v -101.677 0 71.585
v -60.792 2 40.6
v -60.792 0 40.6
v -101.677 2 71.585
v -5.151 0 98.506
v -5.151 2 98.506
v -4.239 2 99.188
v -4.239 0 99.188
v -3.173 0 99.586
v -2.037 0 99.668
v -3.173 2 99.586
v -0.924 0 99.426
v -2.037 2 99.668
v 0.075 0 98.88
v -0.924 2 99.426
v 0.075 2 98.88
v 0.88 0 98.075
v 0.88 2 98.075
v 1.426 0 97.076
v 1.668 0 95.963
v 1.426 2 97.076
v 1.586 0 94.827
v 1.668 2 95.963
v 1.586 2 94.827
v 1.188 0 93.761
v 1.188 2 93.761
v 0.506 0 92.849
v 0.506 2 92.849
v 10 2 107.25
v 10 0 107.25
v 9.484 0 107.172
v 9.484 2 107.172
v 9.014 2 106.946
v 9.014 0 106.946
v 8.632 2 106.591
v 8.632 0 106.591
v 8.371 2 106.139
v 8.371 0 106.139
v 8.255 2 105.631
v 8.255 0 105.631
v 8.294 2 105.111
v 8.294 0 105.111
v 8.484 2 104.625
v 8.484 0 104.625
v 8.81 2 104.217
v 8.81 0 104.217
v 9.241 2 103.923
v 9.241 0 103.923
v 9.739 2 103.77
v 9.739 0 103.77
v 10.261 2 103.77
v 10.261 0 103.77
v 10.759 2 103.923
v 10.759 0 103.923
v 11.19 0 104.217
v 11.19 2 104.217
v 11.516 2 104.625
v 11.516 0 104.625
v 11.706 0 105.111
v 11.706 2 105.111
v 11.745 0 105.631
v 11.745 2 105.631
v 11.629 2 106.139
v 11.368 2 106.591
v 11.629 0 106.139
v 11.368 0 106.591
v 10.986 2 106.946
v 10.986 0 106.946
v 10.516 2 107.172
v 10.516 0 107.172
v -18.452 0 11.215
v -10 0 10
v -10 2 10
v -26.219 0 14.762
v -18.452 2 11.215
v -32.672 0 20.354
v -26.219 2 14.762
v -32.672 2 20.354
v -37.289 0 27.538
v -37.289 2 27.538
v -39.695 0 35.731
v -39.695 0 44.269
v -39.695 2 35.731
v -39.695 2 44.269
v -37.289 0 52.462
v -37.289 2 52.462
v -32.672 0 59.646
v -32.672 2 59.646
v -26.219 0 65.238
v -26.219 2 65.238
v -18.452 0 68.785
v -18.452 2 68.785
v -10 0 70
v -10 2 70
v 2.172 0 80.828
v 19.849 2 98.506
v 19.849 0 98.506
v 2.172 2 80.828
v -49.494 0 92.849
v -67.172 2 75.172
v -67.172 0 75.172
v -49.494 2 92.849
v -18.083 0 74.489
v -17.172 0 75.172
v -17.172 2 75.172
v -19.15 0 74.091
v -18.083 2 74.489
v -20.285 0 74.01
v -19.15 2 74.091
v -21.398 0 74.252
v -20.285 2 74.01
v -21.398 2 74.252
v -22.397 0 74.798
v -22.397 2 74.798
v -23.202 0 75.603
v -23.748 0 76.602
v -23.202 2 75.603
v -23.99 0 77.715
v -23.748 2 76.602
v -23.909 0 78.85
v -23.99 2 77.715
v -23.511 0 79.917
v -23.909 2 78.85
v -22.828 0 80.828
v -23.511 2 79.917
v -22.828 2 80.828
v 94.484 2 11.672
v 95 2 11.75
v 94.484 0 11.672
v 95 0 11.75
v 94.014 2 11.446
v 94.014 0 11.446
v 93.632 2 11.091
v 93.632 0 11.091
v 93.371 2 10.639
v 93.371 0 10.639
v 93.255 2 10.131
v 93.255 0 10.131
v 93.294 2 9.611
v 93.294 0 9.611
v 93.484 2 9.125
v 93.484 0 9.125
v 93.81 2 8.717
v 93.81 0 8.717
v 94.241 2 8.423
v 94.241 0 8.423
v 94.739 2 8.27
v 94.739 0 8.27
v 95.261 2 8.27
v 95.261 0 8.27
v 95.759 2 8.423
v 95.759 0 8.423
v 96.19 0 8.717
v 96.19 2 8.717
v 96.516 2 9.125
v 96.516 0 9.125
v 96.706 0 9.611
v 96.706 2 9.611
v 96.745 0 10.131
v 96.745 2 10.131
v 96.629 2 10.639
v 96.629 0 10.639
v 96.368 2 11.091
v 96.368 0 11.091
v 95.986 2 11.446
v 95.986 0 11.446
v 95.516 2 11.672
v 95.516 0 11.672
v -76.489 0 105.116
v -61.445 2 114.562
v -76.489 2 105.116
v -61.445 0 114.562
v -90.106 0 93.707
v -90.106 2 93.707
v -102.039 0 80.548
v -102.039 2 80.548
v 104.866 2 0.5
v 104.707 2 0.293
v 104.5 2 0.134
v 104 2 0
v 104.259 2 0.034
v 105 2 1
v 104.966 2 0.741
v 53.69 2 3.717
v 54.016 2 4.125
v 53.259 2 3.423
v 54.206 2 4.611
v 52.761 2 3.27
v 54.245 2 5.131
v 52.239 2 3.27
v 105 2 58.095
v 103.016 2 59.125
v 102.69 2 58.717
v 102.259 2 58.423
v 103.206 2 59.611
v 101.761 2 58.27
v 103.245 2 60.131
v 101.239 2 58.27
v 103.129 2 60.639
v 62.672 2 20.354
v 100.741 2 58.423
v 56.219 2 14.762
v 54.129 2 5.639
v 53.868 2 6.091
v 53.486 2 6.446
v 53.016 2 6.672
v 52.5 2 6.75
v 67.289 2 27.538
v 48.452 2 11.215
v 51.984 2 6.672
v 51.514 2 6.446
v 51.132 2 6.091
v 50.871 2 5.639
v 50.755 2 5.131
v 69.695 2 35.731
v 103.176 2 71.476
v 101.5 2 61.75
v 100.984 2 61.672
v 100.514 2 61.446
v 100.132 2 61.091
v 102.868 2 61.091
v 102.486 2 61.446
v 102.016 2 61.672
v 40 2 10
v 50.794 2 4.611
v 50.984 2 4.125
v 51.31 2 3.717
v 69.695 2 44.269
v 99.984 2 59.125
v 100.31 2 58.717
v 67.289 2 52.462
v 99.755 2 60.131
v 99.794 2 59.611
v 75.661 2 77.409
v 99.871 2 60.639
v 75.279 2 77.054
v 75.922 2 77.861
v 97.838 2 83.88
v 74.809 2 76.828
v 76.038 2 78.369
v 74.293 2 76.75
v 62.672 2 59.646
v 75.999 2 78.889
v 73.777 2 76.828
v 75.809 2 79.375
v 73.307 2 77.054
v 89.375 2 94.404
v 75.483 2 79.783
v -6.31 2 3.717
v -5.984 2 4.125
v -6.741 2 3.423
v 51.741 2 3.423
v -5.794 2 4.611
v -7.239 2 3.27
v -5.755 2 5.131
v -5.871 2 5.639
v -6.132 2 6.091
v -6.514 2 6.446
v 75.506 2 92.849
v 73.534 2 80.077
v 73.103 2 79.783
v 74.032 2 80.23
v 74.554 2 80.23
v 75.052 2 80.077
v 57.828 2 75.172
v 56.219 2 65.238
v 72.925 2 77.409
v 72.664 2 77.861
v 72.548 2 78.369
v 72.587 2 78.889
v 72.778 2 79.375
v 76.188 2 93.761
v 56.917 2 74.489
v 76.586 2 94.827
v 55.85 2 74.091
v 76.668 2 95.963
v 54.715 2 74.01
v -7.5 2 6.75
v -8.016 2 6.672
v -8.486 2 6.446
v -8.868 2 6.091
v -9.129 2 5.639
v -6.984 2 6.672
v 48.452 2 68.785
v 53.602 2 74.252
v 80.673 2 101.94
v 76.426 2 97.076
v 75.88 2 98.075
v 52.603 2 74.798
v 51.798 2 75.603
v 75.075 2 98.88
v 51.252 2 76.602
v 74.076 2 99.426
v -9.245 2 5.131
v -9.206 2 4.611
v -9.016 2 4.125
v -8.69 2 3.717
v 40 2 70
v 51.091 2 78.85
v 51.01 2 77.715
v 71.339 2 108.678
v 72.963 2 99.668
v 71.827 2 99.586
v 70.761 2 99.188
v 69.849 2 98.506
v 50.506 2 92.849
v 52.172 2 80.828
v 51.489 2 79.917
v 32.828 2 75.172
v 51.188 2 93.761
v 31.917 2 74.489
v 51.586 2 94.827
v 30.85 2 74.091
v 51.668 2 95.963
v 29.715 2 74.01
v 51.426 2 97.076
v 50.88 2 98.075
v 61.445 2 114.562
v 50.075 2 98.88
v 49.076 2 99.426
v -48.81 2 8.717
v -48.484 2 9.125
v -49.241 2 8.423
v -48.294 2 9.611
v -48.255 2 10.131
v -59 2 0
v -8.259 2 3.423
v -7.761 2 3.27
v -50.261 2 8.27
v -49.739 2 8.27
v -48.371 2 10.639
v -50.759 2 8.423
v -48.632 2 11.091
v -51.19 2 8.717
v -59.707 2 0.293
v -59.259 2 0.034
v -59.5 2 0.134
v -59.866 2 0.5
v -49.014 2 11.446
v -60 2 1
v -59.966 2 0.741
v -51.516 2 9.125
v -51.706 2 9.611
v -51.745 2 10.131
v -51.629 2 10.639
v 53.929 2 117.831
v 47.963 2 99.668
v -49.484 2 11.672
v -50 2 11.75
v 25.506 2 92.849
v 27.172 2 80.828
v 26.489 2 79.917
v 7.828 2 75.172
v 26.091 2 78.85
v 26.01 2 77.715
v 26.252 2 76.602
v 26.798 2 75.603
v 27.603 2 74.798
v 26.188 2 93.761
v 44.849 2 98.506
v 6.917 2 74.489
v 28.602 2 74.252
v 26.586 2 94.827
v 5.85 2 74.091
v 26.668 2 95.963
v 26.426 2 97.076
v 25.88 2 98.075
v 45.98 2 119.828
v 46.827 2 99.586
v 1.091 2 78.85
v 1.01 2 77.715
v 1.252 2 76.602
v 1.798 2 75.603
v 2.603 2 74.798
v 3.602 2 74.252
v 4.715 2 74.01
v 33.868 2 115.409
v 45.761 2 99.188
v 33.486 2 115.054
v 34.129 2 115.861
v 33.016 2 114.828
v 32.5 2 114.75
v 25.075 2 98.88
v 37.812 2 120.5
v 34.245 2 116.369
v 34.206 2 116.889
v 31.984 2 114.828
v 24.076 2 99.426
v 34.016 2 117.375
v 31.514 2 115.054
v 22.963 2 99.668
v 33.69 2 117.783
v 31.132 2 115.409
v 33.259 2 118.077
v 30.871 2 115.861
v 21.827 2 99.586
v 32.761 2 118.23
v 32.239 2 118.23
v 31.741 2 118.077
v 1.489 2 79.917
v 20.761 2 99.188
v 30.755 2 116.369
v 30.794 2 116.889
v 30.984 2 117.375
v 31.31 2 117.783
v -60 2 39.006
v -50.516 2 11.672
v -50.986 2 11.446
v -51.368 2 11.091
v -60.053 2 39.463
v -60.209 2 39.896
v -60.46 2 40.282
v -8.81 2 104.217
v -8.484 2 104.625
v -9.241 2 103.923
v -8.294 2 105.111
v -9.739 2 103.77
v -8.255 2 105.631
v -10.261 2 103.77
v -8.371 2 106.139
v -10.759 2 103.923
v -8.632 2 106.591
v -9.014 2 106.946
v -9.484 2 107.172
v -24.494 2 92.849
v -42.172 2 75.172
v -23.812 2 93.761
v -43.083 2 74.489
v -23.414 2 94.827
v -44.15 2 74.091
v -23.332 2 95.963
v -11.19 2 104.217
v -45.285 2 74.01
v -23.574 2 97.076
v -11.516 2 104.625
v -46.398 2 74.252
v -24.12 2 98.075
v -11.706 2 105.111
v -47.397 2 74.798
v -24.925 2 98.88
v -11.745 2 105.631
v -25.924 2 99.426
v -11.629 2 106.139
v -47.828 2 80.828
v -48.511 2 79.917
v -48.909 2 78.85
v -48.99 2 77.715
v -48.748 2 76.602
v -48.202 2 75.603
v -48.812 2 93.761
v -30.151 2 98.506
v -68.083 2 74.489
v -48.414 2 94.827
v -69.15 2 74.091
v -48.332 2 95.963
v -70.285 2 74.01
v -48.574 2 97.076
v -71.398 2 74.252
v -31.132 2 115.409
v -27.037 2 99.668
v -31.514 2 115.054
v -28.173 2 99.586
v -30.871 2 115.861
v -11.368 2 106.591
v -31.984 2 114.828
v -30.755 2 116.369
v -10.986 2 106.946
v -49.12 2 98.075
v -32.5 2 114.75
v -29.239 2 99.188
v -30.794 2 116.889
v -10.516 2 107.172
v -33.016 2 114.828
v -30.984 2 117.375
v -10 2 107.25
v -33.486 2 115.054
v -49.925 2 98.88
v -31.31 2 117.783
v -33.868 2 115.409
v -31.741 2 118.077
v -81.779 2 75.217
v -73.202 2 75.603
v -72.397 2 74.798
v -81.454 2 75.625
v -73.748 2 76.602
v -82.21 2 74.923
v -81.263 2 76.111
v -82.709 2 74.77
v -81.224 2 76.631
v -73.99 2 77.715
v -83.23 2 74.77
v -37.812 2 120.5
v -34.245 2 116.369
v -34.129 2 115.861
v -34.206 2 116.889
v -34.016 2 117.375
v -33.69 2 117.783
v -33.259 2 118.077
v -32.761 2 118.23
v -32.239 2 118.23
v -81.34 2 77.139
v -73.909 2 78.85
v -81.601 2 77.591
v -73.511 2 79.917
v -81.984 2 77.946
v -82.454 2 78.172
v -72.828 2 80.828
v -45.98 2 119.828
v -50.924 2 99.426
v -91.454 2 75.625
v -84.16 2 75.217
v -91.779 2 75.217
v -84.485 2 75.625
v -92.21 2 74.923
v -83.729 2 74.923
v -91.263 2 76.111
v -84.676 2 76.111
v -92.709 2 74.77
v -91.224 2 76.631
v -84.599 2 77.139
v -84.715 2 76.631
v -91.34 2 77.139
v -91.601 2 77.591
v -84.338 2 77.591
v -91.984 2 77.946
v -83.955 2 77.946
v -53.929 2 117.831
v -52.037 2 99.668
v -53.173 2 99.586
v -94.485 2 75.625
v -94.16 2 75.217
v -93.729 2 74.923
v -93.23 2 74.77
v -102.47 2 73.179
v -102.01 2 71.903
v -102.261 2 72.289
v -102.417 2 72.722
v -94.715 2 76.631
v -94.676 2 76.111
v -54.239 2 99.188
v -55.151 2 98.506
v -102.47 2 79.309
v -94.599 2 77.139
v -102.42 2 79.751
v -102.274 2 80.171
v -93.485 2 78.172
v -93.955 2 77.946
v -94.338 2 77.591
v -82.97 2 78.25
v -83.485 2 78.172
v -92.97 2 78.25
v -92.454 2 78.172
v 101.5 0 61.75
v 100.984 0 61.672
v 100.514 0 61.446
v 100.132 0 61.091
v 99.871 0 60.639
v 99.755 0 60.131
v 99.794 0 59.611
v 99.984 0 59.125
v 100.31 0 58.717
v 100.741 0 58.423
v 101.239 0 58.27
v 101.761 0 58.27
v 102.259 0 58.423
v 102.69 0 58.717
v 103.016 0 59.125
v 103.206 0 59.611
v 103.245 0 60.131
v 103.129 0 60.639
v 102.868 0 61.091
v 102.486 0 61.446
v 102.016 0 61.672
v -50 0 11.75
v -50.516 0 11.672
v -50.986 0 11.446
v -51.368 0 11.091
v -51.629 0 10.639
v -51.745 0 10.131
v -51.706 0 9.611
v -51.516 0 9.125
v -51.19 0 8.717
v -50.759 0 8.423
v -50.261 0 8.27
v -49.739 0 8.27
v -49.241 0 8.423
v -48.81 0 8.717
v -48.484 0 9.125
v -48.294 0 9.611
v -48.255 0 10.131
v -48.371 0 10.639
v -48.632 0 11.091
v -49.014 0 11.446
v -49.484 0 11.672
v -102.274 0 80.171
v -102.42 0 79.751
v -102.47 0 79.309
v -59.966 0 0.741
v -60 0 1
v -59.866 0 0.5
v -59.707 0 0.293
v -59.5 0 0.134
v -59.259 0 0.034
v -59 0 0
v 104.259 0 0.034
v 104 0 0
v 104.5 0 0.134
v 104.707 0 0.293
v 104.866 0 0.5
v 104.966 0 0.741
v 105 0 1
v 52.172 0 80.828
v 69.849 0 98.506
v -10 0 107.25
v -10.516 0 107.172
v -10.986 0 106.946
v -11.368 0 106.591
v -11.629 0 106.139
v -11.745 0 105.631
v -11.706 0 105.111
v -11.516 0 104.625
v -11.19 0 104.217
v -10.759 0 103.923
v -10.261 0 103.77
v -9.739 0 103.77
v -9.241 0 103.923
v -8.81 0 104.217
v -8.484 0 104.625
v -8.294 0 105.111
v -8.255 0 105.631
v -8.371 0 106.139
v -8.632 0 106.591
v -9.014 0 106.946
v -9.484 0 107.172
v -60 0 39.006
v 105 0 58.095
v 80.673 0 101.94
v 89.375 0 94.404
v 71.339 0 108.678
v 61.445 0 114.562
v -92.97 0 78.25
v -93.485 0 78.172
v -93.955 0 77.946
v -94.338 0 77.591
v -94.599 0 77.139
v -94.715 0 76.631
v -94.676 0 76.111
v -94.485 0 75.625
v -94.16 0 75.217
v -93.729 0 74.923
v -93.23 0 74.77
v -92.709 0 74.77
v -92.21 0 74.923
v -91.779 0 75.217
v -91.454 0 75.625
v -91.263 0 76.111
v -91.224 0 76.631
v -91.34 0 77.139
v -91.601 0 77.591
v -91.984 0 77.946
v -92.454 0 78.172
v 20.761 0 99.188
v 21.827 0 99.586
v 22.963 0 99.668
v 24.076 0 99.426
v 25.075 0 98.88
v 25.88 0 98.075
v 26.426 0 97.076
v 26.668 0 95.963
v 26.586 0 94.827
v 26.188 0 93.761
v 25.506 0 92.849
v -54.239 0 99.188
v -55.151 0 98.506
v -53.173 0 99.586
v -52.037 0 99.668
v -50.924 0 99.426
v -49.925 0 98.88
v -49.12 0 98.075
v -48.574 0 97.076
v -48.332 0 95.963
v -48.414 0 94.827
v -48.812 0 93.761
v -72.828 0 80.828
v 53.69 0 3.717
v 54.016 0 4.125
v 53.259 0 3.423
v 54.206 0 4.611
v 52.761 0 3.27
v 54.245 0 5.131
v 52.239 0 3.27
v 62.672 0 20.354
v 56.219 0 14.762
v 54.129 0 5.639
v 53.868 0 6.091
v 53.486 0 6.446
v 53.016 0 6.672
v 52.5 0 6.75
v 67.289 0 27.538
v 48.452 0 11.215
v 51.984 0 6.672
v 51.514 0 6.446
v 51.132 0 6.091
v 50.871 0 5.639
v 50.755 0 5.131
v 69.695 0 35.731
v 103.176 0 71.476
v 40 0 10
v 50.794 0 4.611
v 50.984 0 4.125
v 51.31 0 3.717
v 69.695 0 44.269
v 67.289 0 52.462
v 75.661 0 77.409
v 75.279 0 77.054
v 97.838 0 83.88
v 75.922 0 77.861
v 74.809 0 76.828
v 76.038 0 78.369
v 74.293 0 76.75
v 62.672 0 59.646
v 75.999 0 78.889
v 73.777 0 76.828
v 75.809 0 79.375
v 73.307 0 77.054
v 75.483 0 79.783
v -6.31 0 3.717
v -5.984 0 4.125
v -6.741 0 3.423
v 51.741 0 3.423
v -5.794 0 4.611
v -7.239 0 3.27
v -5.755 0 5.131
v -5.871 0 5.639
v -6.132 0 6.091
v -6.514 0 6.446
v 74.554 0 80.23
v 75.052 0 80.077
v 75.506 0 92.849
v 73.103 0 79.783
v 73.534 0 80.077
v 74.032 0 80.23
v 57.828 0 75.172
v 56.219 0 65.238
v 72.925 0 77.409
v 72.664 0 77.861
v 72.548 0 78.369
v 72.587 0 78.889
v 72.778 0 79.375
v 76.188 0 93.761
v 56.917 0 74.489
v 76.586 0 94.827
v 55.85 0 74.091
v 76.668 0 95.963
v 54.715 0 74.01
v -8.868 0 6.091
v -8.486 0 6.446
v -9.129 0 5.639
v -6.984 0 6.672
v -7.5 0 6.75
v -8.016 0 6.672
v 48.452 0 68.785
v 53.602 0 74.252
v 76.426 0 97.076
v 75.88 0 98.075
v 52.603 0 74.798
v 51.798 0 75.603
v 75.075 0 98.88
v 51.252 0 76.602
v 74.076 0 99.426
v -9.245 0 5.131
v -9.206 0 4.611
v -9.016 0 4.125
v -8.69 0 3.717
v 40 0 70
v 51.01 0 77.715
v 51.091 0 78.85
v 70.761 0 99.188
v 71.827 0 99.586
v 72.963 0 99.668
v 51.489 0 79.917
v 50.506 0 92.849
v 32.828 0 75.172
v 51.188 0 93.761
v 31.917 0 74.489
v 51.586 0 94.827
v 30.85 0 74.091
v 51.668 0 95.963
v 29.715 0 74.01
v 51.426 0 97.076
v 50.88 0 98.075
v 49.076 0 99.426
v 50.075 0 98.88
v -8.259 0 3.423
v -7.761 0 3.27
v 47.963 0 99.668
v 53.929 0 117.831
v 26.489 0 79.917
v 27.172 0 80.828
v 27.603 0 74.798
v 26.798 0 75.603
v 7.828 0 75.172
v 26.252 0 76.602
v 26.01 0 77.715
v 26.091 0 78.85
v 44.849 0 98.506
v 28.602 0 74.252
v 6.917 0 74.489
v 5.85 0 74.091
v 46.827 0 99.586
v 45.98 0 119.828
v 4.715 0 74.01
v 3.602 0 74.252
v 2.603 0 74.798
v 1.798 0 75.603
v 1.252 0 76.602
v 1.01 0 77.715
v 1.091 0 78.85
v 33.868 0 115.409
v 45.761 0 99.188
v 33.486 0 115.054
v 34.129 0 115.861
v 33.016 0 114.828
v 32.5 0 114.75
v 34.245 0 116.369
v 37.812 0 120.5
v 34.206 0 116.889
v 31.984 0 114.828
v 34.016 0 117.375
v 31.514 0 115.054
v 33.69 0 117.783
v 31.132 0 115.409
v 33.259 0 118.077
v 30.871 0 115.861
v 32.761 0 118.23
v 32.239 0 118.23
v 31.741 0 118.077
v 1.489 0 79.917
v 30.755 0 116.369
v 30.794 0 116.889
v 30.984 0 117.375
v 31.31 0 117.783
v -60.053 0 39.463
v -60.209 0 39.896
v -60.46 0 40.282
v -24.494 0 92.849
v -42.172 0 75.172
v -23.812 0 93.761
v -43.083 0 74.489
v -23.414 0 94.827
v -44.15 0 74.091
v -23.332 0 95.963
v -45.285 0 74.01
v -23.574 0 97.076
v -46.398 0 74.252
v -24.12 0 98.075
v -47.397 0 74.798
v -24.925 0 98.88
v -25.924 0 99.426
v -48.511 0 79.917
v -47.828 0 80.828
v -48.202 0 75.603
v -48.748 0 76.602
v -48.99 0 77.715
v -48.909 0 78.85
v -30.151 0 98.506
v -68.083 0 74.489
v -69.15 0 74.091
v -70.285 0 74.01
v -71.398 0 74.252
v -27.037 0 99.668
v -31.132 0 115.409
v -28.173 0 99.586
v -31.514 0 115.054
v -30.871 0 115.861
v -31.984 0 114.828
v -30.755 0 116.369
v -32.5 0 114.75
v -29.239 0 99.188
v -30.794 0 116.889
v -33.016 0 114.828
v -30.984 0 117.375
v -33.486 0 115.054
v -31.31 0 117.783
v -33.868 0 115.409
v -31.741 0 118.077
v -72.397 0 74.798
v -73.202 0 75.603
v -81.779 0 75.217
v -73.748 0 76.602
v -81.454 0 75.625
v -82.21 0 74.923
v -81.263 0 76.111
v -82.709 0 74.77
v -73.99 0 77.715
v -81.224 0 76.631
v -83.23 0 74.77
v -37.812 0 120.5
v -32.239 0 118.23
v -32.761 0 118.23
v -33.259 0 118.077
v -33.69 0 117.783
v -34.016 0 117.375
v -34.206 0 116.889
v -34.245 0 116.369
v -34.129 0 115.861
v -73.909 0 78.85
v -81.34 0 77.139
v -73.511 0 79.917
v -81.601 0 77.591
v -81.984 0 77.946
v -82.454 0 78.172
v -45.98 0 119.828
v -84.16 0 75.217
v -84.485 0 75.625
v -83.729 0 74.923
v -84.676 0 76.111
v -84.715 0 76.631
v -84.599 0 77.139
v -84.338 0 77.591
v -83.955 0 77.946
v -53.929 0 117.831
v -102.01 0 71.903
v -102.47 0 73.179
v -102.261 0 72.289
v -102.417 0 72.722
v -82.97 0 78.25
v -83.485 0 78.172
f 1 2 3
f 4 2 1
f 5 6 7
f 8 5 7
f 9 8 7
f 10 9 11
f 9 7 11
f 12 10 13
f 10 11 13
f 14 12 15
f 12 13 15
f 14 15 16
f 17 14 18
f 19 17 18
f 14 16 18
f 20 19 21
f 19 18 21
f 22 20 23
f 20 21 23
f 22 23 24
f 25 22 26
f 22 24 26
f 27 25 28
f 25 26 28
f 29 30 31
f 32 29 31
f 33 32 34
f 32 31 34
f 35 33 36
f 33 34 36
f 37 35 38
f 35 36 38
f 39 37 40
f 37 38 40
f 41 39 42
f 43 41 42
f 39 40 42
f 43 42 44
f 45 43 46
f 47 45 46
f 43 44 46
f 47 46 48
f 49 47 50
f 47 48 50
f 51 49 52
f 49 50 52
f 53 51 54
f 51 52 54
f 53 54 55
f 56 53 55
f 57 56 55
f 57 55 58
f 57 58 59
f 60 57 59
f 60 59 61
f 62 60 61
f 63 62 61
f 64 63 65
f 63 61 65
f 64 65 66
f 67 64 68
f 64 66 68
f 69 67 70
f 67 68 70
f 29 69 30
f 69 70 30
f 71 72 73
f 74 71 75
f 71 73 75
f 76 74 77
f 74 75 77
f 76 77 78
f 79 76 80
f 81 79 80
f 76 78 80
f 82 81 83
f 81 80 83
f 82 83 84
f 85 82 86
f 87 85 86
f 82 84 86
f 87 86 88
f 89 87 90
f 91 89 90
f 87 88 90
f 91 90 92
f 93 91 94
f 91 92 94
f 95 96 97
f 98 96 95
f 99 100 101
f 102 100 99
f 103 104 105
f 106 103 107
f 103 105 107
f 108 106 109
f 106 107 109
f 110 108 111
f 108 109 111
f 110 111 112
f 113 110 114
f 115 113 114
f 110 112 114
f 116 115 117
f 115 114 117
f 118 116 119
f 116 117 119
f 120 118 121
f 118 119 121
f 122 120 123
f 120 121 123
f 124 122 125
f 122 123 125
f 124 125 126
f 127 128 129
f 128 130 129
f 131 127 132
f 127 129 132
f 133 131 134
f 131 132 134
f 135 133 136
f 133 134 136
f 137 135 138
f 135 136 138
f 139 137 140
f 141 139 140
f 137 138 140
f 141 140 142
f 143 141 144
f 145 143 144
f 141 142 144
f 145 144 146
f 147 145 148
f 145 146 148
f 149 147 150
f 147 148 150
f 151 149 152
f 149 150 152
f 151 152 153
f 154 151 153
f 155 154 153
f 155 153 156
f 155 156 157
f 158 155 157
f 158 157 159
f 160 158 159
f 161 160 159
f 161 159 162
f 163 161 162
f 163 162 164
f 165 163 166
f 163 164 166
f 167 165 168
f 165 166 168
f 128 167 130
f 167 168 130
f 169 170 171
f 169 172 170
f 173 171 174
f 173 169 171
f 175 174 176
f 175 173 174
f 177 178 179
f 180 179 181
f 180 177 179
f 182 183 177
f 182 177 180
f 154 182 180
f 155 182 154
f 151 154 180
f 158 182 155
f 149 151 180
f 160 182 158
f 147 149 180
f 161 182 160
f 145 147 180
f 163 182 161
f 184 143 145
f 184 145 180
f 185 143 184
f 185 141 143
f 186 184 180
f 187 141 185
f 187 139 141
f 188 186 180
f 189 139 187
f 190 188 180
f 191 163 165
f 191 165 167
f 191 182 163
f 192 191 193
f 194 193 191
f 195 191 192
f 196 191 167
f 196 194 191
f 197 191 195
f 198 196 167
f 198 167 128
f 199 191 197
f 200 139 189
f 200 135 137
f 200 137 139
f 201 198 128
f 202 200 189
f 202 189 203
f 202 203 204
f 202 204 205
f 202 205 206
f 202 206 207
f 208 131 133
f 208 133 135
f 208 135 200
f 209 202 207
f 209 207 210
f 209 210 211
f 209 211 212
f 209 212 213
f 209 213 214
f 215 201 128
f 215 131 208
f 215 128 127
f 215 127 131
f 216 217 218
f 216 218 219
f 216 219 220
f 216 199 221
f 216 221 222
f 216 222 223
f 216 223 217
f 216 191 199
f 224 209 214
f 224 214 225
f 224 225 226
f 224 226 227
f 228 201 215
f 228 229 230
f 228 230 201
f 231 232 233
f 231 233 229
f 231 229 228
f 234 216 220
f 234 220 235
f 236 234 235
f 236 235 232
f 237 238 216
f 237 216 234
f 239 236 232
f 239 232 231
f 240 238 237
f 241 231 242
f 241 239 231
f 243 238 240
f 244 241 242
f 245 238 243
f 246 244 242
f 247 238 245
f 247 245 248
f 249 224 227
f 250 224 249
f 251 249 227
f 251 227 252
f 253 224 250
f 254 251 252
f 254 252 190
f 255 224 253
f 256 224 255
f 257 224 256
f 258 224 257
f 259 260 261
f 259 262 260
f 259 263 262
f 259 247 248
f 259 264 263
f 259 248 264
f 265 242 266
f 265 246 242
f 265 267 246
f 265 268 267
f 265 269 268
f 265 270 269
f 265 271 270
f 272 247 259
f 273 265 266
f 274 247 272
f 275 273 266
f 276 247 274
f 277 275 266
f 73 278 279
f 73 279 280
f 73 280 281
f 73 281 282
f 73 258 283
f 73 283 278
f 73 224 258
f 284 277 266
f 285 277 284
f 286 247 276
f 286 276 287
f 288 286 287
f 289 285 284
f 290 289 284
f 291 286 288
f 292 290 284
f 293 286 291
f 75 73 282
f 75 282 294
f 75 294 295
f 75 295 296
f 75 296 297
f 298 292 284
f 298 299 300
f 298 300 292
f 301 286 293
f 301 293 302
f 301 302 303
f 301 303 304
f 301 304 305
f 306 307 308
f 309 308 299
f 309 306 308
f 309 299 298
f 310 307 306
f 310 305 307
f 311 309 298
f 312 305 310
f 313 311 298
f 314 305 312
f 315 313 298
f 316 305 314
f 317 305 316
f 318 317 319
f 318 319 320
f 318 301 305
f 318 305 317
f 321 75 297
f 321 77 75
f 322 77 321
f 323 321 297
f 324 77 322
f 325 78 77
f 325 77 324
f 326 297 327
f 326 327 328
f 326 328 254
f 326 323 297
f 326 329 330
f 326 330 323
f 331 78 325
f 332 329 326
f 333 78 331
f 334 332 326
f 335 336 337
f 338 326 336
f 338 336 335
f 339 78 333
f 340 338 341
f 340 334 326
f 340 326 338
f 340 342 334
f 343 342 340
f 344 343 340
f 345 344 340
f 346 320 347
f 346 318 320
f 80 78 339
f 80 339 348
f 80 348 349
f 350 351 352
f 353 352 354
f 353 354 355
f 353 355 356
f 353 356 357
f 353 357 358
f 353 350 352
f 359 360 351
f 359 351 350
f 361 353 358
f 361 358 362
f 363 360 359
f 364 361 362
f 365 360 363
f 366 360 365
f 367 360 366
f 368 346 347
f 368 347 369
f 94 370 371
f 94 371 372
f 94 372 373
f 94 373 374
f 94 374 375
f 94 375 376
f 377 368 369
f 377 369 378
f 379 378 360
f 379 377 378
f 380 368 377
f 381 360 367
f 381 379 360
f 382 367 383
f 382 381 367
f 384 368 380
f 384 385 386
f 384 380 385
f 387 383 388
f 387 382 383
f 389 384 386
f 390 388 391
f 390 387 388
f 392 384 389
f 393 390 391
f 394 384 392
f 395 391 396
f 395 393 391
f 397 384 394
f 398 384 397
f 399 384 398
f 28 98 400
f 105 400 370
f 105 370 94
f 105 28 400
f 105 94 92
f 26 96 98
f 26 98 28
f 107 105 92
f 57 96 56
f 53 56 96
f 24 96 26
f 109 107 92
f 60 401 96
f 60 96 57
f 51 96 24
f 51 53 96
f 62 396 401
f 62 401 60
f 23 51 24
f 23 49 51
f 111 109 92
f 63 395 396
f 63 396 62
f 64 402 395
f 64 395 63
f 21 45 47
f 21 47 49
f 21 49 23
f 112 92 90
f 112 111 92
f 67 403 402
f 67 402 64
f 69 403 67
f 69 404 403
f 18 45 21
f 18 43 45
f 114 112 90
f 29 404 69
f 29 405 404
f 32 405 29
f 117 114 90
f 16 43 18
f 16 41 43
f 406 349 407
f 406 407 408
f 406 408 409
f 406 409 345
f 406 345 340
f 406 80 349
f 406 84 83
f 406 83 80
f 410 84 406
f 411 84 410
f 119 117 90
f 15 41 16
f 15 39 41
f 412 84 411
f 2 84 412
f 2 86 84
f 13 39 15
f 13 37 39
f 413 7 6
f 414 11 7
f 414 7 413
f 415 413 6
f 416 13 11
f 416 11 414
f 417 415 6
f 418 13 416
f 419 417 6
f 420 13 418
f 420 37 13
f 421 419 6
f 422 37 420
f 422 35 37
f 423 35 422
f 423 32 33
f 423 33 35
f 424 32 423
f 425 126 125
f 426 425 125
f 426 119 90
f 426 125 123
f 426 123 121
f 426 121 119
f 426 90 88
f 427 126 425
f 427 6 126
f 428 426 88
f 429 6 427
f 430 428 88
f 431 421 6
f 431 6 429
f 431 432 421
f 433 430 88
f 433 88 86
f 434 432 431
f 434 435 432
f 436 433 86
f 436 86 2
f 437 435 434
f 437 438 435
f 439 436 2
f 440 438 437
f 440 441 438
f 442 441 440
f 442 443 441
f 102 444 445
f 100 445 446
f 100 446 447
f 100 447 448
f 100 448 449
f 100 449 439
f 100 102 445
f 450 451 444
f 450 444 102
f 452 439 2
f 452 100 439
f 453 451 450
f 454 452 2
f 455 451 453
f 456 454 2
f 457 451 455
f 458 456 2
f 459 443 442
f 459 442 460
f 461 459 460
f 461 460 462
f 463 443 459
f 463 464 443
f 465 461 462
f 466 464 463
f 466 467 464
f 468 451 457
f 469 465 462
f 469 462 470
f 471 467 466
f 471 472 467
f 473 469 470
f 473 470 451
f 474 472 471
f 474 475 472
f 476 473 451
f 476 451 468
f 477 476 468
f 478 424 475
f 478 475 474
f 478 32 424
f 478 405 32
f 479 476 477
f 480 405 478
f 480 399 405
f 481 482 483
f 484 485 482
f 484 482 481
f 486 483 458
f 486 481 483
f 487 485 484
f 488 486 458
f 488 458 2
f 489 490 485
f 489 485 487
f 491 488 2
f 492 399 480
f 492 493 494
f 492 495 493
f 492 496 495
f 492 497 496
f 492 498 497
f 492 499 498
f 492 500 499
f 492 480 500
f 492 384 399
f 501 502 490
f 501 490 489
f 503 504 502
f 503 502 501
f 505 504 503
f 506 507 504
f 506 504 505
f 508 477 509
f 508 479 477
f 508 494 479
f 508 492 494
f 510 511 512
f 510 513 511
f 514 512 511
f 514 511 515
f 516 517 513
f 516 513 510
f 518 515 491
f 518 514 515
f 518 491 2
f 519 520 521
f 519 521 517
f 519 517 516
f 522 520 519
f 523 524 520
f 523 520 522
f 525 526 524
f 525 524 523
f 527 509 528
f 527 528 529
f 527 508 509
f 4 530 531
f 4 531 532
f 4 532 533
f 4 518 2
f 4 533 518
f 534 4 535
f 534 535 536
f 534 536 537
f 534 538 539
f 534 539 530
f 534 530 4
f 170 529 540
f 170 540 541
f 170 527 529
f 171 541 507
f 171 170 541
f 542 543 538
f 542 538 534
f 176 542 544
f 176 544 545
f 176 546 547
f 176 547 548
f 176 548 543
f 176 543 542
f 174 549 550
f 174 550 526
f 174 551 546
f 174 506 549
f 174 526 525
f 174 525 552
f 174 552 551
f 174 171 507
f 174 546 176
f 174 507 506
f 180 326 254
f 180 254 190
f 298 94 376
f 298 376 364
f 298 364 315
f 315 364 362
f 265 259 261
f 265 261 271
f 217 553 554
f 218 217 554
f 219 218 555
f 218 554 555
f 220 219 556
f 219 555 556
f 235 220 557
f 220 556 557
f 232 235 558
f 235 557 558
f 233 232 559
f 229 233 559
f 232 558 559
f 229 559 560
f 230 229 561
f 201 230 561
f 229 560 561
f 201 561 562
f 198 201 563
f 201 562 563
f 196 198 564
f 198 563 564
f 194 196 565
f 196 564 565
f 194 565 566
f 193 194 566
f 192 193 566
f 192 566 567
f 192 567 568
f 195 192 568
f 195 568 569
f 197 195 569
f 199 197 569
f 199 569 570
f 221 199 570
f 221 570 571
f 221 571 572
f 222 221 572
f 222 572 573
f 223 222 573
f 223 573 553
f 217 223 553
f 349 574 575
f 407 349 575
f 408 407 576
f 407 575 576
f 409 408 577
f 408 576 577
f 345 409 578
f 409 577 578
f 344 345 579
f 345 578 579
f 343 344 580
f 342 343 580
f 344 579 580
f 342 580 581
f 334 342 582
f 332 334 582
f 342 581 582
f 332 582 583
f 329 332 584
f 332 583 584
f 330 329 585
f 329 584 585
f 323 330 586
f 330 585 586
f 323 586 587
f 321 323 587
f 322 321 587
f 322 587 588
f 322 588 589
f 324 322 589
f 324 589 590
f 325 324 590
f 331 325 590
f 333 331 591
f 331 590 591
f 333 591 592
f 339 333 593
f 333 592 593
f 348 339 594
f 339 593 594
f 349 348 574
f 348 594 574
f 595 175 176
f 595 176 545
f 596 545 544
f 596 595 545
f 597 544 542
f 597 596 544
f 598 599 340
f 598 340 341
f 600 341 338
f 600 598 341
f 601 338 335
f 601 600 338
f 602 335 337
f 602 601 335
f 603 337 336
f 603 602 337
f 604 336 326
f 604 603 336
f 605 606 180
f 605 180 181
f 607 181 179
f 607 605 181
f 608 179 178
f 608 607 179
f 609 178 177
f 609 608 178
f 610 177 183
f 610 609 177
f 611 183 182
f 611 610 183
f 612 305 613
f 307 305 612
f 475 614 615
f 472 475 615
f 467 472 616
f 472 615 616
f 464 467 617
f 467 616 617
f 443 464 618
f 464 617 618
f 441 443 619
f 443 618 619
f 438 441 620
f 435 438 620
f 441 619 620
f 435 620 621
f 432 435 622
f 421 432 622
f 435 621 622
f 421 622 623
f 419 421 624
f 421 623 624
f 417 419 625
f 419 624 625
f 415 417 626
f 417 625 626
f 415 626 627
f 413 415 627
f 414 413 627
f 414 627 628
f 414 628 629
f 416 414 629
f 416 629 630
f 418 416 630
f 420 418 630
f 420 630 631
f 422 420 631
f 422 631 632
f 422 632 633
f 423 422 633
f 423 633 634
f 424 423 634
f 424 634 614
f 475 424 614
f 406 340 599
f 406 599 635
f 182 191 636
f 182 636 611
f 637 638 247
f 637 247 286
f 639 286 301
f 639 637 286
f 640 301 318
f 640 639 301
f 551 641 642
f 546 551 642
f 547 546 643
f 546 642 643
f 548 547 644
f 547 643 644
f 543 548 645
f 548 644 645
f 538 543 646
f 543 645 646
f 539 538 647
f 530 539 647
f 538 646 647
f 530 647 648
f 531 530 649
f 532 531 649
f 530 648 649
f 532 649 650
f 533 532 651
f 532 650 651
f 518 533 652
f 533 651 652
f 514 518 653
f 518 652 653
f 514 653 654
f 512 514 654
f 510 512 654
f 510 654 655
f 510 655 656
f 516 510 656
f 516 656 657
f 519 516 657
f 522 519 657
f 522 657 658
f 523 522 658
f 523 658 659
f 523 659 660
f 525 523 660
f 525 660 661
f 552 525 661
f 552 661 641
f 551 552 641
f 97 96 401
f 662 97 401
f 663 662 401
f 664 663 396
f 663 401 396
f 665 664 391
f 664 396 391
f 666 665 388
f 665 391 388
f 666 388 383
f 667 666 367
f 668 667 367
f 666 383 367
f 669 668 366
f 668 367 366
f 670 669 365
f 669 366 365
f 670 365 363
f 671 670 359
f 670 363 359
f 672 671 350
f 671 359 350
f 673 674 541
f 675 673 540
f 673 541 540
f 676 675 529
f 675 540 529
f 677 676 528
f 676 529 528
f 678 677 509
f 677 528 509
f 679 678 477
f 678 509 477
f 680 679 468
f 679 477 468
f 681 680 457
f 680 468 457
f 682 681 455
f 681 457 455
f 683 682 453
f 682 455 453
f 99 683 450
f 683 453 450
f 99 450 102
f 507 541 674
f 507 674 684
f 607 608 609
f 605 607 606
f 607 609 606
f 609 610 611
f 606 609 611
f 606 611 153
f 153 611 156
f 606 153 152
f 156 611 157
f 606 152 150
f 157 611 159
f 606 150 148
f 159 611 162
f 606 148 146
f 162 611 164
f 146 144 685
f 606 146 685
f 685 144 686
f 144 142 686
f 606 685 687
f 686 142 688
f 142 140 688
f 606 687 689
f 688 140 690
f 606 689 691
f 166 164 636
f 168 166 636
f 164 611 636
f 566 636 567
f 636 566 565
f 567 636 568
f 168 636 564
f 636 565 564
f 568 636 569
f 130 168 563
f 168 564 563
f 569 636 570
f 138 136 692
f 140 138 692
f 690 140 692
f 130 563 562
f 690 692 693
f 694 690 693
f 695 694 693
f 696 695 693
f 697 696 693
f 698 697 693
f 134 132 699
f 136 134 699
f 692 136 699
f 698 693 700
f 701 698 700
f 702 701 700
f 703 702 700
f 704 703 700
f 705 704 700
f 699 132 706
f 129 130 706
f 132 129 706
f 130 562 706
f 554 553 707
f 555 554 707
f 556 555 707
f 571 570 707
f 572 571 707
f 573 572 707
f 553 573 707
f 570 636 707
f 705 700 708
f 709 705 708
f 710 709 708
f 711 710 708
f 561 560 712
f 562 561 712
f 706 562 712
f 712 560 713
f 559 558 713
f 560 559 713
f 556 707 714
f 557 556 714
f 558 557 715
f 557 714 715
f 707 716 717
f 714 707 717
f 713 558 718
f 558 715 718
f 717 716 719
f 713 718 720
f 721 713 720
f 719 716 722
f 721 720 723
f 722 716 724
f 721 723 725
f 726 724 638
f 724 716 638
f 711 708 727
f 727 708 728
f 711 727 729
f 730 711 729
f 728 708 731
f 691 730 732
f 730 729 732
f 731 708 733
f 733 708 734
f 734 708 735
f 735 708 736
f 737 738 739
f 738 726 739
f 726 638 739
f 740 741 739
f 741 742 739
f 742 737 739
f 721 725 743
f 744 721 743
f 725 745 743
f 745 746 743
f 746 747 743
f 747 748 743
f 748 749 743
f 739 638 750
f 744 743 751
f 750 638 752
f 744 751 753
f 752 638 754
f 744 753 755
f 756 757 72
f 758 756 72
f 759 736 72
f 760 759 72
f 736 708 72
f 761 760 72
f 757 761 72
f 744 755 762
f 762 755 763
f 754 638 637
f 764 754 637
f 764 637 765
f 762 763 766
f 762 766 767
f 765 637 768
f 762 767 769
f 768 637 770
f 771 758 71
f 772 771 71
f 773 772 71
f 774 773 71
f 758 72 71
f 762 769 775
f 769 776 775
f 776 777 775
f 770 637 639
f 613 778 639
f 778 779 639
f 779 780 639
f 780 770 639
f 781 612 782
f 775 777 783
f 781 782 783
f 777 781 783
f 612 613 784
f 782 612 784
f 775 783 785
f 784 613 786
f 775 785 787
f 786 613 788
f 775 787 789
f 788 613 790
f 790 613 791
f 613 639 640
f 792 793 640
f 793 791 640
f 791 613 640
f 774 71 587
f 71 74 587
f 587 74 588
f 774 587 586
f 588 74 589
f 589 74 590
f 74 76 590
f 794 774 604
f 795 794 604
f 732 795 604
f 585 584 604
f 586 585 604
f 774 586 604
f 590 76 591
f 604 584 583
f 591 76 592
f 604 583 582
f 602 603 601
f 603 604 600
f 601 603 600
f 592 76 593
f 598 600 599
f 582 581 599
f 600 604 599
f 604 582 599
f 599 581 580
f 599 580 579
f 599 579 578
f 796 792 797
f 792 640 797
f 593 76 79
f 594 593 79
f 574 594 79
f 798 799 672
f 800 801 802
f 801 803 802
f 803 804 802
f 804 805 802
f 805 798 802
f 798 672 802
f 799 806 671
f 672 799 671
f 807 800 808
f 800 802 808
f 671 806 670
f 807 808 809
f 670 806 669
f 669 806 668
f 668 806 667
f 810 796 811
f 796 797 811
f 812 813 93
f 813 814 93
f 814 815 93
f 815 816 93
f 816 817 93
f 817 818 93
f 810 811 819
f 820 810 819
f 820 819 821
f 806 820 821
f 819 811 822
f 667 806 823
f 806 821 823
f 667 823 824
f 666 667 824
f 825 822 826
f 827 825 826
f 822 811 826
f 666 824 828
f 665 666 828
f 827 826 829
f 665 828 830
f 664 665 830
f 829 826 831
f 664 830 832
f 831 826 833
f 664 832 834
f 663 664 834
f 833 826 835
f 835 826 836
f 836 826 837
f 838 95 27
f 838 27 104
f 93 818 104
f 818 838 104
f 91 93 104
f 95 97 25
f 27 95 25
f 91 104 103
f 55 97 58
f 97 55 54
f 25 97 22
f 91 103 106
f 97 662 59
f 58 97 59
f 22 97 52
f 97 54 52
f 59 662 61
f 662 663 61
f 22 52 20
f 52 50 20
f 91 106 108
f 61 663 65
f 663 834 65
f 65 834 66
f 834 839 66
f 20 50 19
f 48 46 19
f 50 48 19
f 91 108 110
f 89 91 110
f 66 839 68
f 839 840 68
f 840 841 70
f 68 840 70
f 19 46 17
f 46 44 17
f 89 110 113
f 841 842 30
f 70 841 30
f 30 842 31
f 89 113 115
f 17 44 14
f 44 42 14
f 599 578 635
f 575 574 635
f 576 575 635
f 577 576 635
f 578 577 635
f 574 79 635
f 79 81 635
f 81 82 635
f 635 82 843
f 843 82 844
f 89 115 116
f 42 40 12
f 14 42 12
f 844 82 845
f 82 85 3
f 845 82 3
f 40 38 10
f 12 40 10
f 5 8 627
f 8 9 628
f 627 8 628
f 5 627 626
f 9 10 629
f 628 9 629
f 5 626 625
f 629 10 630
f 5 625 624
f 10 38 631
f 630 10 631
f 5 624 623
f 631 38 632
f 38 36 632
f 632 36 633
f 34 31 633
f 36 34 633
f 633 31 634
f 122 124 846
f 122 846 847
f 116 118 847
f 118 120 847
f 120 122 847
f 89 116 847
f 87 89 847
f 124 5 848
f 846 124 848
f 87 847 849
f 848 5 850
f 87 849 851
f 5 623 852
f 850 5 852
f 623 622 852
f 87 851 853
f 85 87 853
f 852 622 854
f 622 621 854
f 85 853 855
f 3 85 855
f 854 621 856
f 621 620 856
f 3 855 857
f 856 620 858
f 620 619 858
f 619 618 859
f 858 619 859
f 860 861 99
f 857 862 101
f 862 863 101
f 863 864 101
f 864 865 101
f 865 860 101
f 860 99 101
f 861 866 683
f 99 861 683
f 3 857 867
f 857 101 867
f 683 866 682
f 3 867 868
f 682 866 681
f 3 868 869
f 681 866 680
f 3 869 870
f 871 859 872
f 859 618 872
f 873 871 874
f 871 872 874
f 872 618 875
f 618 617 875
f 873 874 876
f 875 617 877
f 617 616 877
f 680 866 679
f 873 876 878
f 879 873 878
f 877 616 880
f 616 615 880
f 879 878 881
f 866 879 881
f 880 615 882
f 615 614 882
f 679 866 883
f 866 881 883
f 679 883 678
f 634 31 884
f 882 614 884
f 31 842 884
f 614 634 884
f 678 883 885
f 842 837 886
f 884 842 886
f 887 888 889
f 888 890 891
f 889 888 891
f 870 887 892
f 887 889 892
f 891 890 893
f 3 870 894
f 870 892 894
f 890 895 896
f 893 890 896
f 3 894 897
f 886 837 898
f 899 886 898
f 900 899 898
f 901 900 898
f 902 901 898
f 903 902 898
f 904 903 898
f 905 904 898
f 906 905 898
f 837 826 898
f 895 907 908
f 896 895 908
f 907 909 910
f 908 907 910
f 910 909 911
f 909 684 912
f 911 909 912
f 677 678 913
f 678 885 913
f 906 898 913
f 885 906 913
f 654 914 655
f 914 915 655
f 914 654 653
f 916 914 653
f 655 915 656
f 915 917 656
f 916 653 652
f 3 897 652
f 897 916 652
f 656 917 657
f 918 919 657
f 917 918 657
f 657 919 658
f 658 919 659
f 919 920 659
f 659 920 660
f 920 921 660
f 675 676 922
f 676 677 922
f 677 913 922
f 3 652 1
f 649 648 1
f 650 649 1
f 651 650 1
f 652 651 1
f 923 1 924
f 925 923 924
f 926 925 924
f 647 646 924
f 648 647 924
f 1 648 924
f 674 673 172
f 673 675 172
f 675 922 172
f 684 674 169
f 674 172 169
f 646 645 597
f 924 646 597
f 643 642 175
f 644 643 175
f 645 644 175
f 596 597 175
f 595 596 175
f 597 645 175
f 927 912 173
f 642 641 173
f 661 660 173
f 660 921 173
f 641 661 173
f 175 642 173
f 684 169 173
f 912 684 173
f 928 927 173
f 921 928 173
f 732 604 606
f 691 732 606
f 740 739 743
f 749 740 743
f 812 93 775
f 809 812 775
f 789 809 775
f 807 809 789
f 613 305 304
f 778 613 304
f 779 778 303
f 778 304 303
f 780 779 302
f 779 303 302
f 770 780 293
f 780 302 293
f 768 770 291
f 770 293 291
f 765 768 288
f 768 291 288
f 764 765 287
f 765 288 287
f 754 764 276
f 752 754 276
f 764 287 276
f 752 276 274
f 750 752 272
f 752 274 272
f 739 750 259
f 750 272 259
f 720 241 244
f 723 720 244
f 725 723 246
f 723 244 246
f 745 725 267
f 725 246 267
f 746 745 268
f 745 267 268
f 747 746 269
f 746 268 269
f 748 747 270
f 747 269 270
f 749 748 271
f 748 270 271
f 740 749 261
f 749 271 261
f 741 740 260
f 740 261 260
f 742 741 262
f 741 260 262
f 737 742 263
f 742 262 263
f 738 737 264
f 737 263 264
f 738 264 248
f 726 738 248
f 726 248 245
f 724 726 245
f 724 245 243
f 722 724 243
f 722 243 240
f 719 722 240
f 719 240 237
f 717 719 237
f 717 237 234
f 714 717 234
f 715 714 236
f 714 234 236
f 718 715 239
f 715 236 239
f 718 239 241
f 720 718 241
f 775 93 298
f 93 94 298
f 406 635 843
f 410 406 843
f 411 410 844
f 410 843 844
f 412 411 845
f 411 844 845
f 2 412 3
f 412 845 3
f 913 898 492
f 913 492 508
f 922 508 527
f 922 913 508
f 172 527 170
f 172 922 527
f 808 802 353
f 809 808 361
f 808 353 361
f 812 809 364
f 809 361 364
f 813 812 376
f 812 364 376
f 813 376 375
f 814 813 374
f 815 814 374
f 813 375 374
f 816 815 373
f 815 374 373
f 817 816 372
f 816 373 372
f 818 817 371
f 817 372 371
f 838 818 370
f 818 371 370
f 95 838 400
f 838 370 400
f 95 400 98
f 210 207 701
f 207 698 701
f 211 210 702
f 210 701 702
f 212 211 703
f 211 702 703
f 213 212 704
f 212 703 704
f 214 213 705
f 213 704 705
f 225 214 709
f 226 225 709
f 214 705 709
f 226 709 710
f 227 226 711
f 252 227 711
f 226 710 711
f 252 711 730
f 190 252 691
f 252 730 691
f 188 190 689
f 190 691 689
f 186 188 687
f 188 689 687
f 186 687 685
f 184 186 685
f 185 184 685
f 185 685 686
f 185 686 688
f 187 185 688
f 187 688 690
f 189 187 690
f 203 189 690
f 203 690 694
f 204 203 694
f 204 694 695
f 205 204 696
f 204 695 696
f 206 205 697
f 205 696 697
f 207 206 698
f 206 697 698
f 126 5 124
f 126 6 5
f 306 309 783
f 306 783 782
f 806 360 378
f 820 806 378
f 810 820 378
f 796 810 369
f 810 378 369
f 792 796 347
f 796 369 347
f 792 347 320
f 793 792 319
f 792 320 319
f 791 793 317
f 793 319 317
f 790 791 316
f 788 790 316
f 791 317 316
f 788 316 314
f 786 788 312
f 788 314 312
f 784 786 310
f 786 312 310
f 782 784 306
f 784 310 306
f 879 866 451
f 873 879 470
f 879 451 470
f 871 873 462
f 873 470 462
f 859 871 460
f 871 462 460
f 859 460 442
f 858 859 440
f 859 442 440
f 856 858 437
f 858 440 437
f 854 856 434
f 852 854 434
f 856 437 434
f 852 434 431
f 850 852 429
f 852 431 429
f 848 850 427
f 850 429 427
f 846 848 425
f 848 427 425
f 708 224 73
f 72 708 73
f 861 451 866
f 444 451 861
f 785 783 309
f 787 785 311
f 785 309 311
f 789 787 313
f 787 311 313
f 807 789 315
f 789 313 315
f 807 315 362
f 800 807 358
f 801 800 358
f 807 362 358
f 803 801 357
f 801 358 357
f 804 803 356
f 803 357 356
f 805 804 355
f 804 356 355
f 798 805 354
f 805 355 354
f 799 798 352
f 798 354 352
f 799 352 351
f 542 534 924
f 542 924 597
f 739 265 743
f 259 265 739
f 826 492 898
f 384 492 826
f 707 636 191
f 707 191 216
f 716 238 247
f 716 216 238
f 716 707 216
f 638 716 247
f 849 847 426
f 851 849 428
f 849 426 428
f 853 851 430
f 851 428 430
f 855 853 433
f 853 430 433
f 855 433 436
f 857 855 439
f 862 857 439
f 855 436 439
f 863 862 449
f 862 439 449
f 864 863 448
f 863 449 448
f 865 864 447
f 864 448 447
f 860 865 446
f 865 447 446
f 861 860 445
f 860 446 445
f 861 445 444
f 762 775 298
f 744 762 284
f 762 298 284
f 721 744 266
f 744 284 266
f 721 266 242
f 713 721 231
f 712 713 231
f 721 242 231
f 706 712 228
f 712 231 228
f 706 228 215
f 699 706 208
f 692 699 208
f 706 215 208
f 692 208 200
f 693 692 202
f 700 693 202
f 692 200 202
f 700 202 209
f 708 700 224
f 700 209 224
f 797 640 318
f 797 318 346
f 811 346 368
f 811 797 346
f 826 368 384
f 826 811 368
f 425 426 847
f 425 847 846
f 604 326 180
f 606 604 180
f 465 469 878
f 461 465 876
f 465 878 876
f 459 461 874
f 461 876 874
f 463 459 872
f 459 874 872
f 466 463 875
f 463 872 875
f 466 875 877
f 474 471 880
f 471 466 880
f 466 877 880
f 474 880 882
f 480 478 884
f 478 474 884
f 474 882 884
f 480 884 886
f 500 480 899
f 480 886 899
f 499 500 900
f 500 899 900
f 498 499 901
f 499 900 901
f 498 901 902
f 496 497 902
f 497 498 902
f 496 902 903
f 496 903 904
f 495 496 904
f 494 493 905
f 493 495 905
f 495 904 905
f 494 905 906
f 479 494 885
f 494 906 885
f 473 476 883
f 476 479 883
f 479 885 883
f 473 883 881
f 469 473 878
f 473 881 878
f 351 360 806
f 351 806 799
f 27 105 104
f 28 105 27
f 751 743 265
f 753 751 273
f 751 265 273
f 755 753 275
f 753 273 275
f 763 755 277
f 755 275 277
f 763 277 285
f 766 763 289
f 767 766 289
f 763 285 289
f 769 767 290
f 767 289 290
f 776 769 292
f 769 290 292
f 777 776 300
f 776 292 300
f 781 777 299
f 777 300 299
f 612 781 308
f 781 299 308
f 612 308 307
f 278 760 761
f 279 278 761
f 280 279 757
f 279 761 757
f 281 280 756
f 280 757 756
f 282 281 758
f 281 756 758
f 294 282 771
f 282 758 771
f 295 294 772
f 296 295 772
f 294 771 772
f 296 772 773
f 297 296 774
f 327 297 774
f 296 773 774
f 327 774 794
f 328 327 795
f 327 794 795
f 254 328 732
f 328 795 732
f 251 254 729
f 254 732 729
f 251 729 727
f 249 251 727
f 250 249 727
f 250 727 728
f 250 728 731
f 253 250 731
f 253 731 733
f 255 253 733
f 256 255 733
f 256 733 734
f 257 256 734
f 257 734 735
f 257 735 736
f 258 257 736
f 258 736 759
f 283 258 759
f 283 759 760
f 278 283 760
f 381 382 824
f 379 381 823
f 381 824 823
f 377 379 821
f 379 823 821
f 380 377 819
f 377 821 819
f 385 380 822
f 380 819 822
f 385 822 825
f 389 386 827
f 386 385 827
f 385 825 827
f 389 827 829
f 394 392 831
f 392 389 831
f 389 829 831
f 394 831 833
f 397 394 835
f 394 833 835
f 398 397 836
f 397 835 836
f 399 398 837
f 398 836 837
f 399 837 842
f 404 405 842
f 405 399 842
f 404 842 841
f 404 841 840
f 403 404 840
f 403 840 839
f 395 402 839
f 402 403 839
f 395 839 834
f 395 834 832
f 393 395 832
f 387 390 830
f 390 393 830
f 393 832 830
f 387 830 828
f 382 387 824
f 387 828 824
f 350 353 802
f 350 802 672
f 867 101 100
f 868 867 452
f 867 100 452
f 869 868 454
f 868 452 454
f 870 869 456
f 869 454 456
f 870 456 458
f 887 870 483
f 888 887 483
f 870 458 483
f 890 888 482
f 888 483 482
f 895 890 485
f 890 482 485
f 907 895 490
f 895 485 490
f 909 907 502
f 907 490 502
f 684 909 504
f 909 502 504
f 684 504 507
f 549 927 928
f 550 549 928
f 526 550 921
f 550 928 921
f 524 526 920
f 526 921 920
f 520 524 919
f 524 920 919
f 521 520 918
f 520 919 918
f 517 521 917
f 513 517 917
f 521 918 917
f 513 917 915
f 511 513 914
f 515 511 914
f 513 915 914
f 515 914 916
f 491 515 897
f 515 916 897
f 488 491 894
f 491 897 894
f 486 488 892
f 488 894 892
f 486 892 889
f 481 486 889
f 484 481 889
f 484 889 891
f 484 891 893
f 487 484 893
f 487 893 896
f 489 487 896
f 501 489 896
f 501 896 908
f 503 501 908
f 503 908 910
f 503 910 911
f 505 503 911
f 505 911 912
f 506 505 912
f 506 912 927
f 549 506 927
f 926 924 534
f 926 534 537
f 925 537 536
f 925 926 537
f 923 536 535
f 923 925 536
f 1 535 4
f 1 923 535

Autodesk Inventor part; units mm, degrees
ref_plane "YZ Plane" through (0, 0, 0) normal (1, 0, 0) x (0, 1, 0)
ref_plane "XZ Plane" through (0, 0, 0) normal (0, 1, 0) x (-1, 0, 0)
ref_plane "XY Plane" through (0, 0, 0) normal (0, 0, 1) x (1, 0, 0)
sketch "スケッチ1" plane through (0, 0, 0) normal (0, 1, 0) x (-1, 0, 0)
  circle A0 centre (0, 0) radius 130
  dimension "d0" = 260
extrude "プレート1" add sketch "スケッチ1" along normal blind 2
sketch "スケッチ4" plane through (0, 2, 0) normal (0, 1, 0) x (1, 0, 0)
  circle A0 centre (0, 0) radius 130 projected
  line L0 (-106.1838, 75) -> (-60, 40)
  line L1 (-60, 40) -> (-60, -40)
  line L2 (-60, -40) -> (-106.1838, -75)
  point P0 (-60, 0)
  dimension "d17" = 40
  dimension "d18" = 75
  dimension "d19" = 60
extrude "押し出し2" cut sketch "スケッチ4" against normal through all contours L0 L1 L2 A0 picked at (-83.3333, 0)
sketch "スケッチ7" plane through (0, 2, 0) normal (0, 1, 0) x (1, 0, 0)
  arc A0 (-106.1838, -75) -> (-106.1838, 75) centre (0, 0) ccw projected
  line L0 (-48.7827, 120.5) -> (48.7827, 120.5)
  line L1 (-48.7827, -120.5) -> (48.7827, -120.5)
  line L2 (105, -76.6485) -> (105, 76.6485)
  dimension "d68" = 120.5
  dimension "d69" = 120.5
  dimension "d70" = 105
extrude "押し出し4" cut sketch "スケッチ7" against normal through all
fillet "フィレット4" radius 50 6 edges at (-48.7827, 1, 120.5) (48.7827, 1, 120.5) (105, 1, -76.6485) (105, 1, 76.6485) (-48.7827, 1, -120.5) (48.7827, 1, -120.5)
sketch "スケッチ9" plane through (0, 2, 0) normal (0, 1, 0) x (1, 0, 0)
  line L0 (101.5, -60) -> (101.5, 60) construction
  line L1 (101.5, -60) -> (221.5, -60) construction
  line L2 (105, -58.0948) -> (105, 58.0948) construction
  point P0 (0, 0)
  point P1 (101.5, 0)
  dimension "d71" = 120
  dimension "d72" = 90
  dimension "d73" = 3.5
hole "穴4" at (101.5, 2, 60) at (101.5, 2, -60) direction (0, -1, 0) diameter 3.5 depth 2 tip angle 118
sketch "スケッチ10" plane through (0, 2, 0) normal (0, 1, 0) x (1, 0, 0)
  line L0 (10, -105.5) -> (-10, -105.5) construction
  line L1 (-10, -105.5) -> (-10, 105.5) construction
  line L2 (-10, 105.5) -> (10, 105.5) construction
  line L3 (10, 105.5) -> (10, -105.5) construction
  line L4 (10, -105.5) -> (-10, 105.5) construction
  line L5 (-10, -105.5) -> (10, 105.5) construction
  point P0 (0, 0)
  dimension "d81" = 20
  dimension "d82" = 211
hole "穴5" at (-10, 2, 105.5) at (10, 2, 105.5) at (10, 2, -105.5) at (-10, 2, -105.5) direction (0, -1, 0) diameter 3.5 depth 2 tip angle 118
sketch "スケッチ11" plane through (0, 2, 0) normal (0, 1, 0) x (1, 0, 0)
  line L0 (-32.5, 116.5) -> (32.5, 116.5) construction
  line L1 (-32.5, 116.5) -> (32.5, 116.5) construction
  line L2 (37.812, 120.5) -> (-37.812, 120.5) construction
  point P0 (0, 0)
  point P1 (0, 116.5)
  dimension "d90" = 65
  dimension "d91" = 0
  dimension "d92" = 4
hole "穴6" at (32.5, 2, -116.5) at (-32.5, 2, -116.5) direction (0, -1, 0) diameter 3.5 end through all
mirror "ミラー3" about plane through (0, 0, 0) normal (0, 0, 1) of "穴6"
sketch "スケッチ12" plane through (0, 2, 0) normal (0, 1, 0) x (1, 0, 0)
  line L0 (-50, 10) -> (-50, -10) construction
  line L1 (-50, 10) -> (-30, 10) construction
  line L2 (-60, 40) -> (-60, -40) construction
  point P0 (0, 0)
  point P1 (-50, 0)
  dimension "d100" = 20
  dimension "d101" = 90
  dimension "d102" = 10
hole "穴7" at (-50, 2, 10) at (-50, 2, -10) direction (0, -1, 0) diameter 3.5 end through all
sketch "スケッチ13" plane through (0, 2, 0) normal (0, 1, 0) x (1, 0, 0)
  line L0 (-10, 40) -> (40, 40) construction
  line L1 (-10, 10) -> (40, 10)
  line L2 (40, 70) -> (-10, 70)
  arc A0 (-10, 70) -> (-10, 10) centre (-10, 40) ccw
  arc A1 (40, 10) -> (40, 70) centre (40, 40) ccw
  point P0 (0, 0)
  point P1 (15, 40)
  dimension "d110" = 40
  dimension "d111" = 60
  dimension "d112" = 50
  dimension "d113" = 15
extrude "押し出し5" cut sketch "スケッチ13" against normal through all
sketch "スケッチ14" plane through (0, 2, 0) normal (0, 1, 0) x (1, 0, 0)
  line L0 (72.6777, 95.6777) -> (55, 78) construction
  line L1 (75.5061, 92.8492) -> (57.8284, 75.1716)
  line L2 (52.1716, 80.8284) -> (69.8492, 98.5061)
  arc A0 (75.5061, 92.8492) -> (69.8492, 98.5061) centre (72.6777, 95.6777) ccw
  arc A1 (52.1716, 80.8284) -> (57.8284, 75.1716) centre (55, 78) ccw
  line L3 (-10, 70) -> (40, 70) projected
  point P0 (0, 0)
  point P1 (63.8388, 86.8388)
  dimension "d116" = 135
  dimension "d117" = 8
  dimension "d118" = 25
  dimension "d119" = 4
  dimension "d120" = 15
extrude "押し出し6" cut sketch "スケッチ14" against normal through all
pattern_linear "矩形状パターン1" count 6 spacing 25 along (-1, 0, 0) of "押し出し6"
mirror "ミラー4" about plane through (0, 0, 0) normal (0, 0, 1) of "押し出し5", "押し出し6", "矩形状パターン1"
sketch "スケッチ15" plane through (0, 0, 0) normal (0, -1, 0) x (1, 0, 0)
  arc A0 (73.6766, 79.5874) -> (73.6766, 77.4126) centre (74.2931, 78.5) ccw projected
  arc A1 (74.9095, -79.5874) -> (74.9095, -77.4126) centre (74.2931, -78.5) ccw projected
  point P0 (0, 0)
hole "穴8" at (74.2931, 0, -78.5) at (74.2931, 0, 78.5) direction (0, 1, 0) diameter 3.5 end through all
sketch "スケッチ16" plane through (0, 2, 0) normal (0, 1, 0) x (1, 0, 0)
  arc A0 (-61.4446, 114.5625) -> (-106.1838, 75) centre (0, 0) ccw projected
  arc A1 (-106.1838, -75) -> (-61.4446, -114.5625) centre (0, 0) ccw projected
  line L0 (-102.4695, 80) -> (-102.4695, -80)
  line L1 (-102.4695, 80) -> (57.5305, 80) construction
  line L2 (-106.1838, 75) -> (-60, 40) projected
  line L3 (-60, -40) -> (-106.1838, -75) projected
  point P0 (-102.4695, 72.1852)
  point P1 (-102.4695, -72.1852)
  dimension "d133" = 160
  dimension "d134" = 90
extrude "押し出し7" cut sketch "スケッチ16" against normal through all
sketch "スケッチ17" plane through (0, 2, 0) normal (0, 1, 0) x (1, 0, 0)
  line L0 (-92.9695, 76.5) -> (-82.9695, 76.5) construction
  line L1 (-82.9695, 76.5) -> (-82.9695, -76.5) construction
  line L2 (-82.9695, -76.5) -> (-92.9695, -76.5) construction
  line L3 (-92.9695, -76.5) -> (-92.9695, 76.5) construction
  line L4 (-92.9695, 76.5) -> (-82.9695, -76.5) construction
  line L5 (-82.9695, 76.5) -> (-92.9695, -76.5) construction
  line L6 (-102.4695, 80) -> (-102.4695, 72.1852) construction
  point P0 (0, 0)
  point P1 (-87.9695, 0)
  dimension "d137" = 10
  dimension "d138" = 153
  dimension "d139" = 9.5
hole "穴9" at (-92.9695, 2, -76.5) at (-82.9695, 2, -76.5) at (-92.9695, 2, 76.5) at (-82.9695, 2, 76.5) direction (0, -1, 0) diameter 3.5 end through all
fillet "フィレット5" radius 2 6 edges at (-102.4695, 1, -72.1852) (-102.4695, 1, 80) (-102.4695, 1, -80) (-60, 1, -40) (-60, 1, 40) (-102.4695, 1, 72.1852)
sketch "スケッチ18" plane through (0, 2, 0) normal (0, 1, 0) x (1, 0, 0)
  line L0 (105, -58.0948) -> (105, 58.0948) projected
  line L1 (-60, 39.0062) -> (-60, -39.0062) projected
  line L2 (-60, 0) -> (105, 0) construction
  circle A0 centre (-50, 10) radius 1.75 construction
  line L3 (95, -10) -> (-50, -10) construction
  line L4 (-50, -10) -> (-50, 10) construction
  line L5 (-50, 10) -> (95, 10) construction
  line L6 (95, 10) -> (95, -10) construction
  line L7 (95, -10) -> (-50, 10) construction
  line L8 (-50, -10) -> (95, 10) construction
  line L9 (52.5, -5) -> (-7.5, -5) construction
  line L10 (-7.5, -5) -> (-7.5, 5) construction
  line L11 (-7.5, 5) -> (52.5, 5) construction
  line L12 (52.5, 5) -> (52.5, -5) construction
  line L13 (52.5, -5) -> (-7.5, 5) construction
  line L14 (-7.5, -5) -> (52.5, 5) construction
  point P0 (0, 0)
  point P1 (22.5, 0)
  point P2 (22.5, 0)
  dimension "d148" = 60
  dimension "d149" = 10
hole "穴10" at (95, 2, 10) at (95, 2, -10) at (52.5, 2, 5) at (52.5, 2, -5) at (-7.5, 2, -5) at (-7.5, 2, 5) direction (0, -1, 0) diameter 3.5 end through all
sketch "スケッチ19" plane through (0, 2, 0) normal (0, 1, 0) x (1, 0, 0)
  line L0 (-60, 39.0062) -> (-60, -39.0062) projected
  arc A0 (-60, 39.0062) -> (-60.792, 40.6002) centre (-62, 39.0062) ccw projected
  line L1 (-101.6775, 71.5849) -> (-60.792, 40.6002) projected
  arc A1 (-102.4695, 73.1789) -> (-101.6775, 71.5849) centre (-100.4695, 73.1789) ccw projected
  line L2 (-102.4695, 79.3088) -> (-102.4695, 73.1789) projected
  arc A2 (-102.0393, 80.548) -> (-102.4695, 79.3088) centre (-100.4695, 79.3088) ccw projected
  arc A3 (-61.4446, 114.5625) -> (-102.0393, 80.548) centre (0, 0) ccw projected
  arc A4 (-37.812, 120.5) -> (-61.4446, 114.5625) centre (-37.812, 70.5) ccw projected
  line L3 (37.812, 120.5) -> (-37.812, 120.5) projected
  arc A5 (61.4446, 114.5625) -> (37.812, 120.5) centre (37.812, 70.5) ccw projected
  arc A6 (89.375, 94.404) -> (61.4446, 114.5625) centre (0, 0) ccw projected
  arc A7 (105, 58.0948) -> (89.375, 94.404) centre (55, 58.0948) ccw projected
  line L4 (105, -58.0948) -> (105, 58.0948) projected
  line L5 (-60, 0) -> (105, 0)
extrude "押し出し8" cut sketch "スケッチ19" against normal through all
fillet "フィレット6" radius 1 2 edges at (-60, 1, 0) (105, 1, 0)
sketch "スケッチ20" plane through (0, 0, 0) normal (0, 1, 0) x (-1, 0, 0)
  line L0 (115.5948, 100.5744) -> (-72.3437, 168.9784)
  line L1 (-72.3437, 168.9784) -> (-130.4866, 9.2322)
  line L2 (-130.4866, 9.2322) -> (57.4519, -59.1718)
  line L3 (57.4519, -59.1718) -> (115.5948, 100.5744)
  line L4 (-104, 0) -> (59, 0) projected
  point P0 (0, 0)
  dimension "d161" = 200
  dimension "d162" = 20
equation "\"d69\" = d68"
equation "\"d79\" = Thickness"
equation "\"d88\" = Thickness"
equation "\"d98\" = Thickness"
equation "\"d108\" = Thickness"
equation "\"d131\" = Thickness"
equation "\"d145\" = Thickness"
equation "\"d155\" = Thickness"
equation "\"d1\" = Thickness"
equation "\"BendRadius\" = Thickness"
equation "\"BendReliefWidth\" = Thickness"
equation "\"BendReliefDepth\" = 0.5 * Thickness"
equation "\"CornerReliefSize\" = 4 * Thickness"
equation "\"MinimumRemnant\" = 2 * Thickness"
equation "\"TransitionRadius\" = BendRadius"
equation "\"JacobiRadiusSize\" = BendRadius"
equation "\"GapSize\" = Thickness"
equation "\"Thickness\" = 2"
properties part number "T2.0_frame-base3"
